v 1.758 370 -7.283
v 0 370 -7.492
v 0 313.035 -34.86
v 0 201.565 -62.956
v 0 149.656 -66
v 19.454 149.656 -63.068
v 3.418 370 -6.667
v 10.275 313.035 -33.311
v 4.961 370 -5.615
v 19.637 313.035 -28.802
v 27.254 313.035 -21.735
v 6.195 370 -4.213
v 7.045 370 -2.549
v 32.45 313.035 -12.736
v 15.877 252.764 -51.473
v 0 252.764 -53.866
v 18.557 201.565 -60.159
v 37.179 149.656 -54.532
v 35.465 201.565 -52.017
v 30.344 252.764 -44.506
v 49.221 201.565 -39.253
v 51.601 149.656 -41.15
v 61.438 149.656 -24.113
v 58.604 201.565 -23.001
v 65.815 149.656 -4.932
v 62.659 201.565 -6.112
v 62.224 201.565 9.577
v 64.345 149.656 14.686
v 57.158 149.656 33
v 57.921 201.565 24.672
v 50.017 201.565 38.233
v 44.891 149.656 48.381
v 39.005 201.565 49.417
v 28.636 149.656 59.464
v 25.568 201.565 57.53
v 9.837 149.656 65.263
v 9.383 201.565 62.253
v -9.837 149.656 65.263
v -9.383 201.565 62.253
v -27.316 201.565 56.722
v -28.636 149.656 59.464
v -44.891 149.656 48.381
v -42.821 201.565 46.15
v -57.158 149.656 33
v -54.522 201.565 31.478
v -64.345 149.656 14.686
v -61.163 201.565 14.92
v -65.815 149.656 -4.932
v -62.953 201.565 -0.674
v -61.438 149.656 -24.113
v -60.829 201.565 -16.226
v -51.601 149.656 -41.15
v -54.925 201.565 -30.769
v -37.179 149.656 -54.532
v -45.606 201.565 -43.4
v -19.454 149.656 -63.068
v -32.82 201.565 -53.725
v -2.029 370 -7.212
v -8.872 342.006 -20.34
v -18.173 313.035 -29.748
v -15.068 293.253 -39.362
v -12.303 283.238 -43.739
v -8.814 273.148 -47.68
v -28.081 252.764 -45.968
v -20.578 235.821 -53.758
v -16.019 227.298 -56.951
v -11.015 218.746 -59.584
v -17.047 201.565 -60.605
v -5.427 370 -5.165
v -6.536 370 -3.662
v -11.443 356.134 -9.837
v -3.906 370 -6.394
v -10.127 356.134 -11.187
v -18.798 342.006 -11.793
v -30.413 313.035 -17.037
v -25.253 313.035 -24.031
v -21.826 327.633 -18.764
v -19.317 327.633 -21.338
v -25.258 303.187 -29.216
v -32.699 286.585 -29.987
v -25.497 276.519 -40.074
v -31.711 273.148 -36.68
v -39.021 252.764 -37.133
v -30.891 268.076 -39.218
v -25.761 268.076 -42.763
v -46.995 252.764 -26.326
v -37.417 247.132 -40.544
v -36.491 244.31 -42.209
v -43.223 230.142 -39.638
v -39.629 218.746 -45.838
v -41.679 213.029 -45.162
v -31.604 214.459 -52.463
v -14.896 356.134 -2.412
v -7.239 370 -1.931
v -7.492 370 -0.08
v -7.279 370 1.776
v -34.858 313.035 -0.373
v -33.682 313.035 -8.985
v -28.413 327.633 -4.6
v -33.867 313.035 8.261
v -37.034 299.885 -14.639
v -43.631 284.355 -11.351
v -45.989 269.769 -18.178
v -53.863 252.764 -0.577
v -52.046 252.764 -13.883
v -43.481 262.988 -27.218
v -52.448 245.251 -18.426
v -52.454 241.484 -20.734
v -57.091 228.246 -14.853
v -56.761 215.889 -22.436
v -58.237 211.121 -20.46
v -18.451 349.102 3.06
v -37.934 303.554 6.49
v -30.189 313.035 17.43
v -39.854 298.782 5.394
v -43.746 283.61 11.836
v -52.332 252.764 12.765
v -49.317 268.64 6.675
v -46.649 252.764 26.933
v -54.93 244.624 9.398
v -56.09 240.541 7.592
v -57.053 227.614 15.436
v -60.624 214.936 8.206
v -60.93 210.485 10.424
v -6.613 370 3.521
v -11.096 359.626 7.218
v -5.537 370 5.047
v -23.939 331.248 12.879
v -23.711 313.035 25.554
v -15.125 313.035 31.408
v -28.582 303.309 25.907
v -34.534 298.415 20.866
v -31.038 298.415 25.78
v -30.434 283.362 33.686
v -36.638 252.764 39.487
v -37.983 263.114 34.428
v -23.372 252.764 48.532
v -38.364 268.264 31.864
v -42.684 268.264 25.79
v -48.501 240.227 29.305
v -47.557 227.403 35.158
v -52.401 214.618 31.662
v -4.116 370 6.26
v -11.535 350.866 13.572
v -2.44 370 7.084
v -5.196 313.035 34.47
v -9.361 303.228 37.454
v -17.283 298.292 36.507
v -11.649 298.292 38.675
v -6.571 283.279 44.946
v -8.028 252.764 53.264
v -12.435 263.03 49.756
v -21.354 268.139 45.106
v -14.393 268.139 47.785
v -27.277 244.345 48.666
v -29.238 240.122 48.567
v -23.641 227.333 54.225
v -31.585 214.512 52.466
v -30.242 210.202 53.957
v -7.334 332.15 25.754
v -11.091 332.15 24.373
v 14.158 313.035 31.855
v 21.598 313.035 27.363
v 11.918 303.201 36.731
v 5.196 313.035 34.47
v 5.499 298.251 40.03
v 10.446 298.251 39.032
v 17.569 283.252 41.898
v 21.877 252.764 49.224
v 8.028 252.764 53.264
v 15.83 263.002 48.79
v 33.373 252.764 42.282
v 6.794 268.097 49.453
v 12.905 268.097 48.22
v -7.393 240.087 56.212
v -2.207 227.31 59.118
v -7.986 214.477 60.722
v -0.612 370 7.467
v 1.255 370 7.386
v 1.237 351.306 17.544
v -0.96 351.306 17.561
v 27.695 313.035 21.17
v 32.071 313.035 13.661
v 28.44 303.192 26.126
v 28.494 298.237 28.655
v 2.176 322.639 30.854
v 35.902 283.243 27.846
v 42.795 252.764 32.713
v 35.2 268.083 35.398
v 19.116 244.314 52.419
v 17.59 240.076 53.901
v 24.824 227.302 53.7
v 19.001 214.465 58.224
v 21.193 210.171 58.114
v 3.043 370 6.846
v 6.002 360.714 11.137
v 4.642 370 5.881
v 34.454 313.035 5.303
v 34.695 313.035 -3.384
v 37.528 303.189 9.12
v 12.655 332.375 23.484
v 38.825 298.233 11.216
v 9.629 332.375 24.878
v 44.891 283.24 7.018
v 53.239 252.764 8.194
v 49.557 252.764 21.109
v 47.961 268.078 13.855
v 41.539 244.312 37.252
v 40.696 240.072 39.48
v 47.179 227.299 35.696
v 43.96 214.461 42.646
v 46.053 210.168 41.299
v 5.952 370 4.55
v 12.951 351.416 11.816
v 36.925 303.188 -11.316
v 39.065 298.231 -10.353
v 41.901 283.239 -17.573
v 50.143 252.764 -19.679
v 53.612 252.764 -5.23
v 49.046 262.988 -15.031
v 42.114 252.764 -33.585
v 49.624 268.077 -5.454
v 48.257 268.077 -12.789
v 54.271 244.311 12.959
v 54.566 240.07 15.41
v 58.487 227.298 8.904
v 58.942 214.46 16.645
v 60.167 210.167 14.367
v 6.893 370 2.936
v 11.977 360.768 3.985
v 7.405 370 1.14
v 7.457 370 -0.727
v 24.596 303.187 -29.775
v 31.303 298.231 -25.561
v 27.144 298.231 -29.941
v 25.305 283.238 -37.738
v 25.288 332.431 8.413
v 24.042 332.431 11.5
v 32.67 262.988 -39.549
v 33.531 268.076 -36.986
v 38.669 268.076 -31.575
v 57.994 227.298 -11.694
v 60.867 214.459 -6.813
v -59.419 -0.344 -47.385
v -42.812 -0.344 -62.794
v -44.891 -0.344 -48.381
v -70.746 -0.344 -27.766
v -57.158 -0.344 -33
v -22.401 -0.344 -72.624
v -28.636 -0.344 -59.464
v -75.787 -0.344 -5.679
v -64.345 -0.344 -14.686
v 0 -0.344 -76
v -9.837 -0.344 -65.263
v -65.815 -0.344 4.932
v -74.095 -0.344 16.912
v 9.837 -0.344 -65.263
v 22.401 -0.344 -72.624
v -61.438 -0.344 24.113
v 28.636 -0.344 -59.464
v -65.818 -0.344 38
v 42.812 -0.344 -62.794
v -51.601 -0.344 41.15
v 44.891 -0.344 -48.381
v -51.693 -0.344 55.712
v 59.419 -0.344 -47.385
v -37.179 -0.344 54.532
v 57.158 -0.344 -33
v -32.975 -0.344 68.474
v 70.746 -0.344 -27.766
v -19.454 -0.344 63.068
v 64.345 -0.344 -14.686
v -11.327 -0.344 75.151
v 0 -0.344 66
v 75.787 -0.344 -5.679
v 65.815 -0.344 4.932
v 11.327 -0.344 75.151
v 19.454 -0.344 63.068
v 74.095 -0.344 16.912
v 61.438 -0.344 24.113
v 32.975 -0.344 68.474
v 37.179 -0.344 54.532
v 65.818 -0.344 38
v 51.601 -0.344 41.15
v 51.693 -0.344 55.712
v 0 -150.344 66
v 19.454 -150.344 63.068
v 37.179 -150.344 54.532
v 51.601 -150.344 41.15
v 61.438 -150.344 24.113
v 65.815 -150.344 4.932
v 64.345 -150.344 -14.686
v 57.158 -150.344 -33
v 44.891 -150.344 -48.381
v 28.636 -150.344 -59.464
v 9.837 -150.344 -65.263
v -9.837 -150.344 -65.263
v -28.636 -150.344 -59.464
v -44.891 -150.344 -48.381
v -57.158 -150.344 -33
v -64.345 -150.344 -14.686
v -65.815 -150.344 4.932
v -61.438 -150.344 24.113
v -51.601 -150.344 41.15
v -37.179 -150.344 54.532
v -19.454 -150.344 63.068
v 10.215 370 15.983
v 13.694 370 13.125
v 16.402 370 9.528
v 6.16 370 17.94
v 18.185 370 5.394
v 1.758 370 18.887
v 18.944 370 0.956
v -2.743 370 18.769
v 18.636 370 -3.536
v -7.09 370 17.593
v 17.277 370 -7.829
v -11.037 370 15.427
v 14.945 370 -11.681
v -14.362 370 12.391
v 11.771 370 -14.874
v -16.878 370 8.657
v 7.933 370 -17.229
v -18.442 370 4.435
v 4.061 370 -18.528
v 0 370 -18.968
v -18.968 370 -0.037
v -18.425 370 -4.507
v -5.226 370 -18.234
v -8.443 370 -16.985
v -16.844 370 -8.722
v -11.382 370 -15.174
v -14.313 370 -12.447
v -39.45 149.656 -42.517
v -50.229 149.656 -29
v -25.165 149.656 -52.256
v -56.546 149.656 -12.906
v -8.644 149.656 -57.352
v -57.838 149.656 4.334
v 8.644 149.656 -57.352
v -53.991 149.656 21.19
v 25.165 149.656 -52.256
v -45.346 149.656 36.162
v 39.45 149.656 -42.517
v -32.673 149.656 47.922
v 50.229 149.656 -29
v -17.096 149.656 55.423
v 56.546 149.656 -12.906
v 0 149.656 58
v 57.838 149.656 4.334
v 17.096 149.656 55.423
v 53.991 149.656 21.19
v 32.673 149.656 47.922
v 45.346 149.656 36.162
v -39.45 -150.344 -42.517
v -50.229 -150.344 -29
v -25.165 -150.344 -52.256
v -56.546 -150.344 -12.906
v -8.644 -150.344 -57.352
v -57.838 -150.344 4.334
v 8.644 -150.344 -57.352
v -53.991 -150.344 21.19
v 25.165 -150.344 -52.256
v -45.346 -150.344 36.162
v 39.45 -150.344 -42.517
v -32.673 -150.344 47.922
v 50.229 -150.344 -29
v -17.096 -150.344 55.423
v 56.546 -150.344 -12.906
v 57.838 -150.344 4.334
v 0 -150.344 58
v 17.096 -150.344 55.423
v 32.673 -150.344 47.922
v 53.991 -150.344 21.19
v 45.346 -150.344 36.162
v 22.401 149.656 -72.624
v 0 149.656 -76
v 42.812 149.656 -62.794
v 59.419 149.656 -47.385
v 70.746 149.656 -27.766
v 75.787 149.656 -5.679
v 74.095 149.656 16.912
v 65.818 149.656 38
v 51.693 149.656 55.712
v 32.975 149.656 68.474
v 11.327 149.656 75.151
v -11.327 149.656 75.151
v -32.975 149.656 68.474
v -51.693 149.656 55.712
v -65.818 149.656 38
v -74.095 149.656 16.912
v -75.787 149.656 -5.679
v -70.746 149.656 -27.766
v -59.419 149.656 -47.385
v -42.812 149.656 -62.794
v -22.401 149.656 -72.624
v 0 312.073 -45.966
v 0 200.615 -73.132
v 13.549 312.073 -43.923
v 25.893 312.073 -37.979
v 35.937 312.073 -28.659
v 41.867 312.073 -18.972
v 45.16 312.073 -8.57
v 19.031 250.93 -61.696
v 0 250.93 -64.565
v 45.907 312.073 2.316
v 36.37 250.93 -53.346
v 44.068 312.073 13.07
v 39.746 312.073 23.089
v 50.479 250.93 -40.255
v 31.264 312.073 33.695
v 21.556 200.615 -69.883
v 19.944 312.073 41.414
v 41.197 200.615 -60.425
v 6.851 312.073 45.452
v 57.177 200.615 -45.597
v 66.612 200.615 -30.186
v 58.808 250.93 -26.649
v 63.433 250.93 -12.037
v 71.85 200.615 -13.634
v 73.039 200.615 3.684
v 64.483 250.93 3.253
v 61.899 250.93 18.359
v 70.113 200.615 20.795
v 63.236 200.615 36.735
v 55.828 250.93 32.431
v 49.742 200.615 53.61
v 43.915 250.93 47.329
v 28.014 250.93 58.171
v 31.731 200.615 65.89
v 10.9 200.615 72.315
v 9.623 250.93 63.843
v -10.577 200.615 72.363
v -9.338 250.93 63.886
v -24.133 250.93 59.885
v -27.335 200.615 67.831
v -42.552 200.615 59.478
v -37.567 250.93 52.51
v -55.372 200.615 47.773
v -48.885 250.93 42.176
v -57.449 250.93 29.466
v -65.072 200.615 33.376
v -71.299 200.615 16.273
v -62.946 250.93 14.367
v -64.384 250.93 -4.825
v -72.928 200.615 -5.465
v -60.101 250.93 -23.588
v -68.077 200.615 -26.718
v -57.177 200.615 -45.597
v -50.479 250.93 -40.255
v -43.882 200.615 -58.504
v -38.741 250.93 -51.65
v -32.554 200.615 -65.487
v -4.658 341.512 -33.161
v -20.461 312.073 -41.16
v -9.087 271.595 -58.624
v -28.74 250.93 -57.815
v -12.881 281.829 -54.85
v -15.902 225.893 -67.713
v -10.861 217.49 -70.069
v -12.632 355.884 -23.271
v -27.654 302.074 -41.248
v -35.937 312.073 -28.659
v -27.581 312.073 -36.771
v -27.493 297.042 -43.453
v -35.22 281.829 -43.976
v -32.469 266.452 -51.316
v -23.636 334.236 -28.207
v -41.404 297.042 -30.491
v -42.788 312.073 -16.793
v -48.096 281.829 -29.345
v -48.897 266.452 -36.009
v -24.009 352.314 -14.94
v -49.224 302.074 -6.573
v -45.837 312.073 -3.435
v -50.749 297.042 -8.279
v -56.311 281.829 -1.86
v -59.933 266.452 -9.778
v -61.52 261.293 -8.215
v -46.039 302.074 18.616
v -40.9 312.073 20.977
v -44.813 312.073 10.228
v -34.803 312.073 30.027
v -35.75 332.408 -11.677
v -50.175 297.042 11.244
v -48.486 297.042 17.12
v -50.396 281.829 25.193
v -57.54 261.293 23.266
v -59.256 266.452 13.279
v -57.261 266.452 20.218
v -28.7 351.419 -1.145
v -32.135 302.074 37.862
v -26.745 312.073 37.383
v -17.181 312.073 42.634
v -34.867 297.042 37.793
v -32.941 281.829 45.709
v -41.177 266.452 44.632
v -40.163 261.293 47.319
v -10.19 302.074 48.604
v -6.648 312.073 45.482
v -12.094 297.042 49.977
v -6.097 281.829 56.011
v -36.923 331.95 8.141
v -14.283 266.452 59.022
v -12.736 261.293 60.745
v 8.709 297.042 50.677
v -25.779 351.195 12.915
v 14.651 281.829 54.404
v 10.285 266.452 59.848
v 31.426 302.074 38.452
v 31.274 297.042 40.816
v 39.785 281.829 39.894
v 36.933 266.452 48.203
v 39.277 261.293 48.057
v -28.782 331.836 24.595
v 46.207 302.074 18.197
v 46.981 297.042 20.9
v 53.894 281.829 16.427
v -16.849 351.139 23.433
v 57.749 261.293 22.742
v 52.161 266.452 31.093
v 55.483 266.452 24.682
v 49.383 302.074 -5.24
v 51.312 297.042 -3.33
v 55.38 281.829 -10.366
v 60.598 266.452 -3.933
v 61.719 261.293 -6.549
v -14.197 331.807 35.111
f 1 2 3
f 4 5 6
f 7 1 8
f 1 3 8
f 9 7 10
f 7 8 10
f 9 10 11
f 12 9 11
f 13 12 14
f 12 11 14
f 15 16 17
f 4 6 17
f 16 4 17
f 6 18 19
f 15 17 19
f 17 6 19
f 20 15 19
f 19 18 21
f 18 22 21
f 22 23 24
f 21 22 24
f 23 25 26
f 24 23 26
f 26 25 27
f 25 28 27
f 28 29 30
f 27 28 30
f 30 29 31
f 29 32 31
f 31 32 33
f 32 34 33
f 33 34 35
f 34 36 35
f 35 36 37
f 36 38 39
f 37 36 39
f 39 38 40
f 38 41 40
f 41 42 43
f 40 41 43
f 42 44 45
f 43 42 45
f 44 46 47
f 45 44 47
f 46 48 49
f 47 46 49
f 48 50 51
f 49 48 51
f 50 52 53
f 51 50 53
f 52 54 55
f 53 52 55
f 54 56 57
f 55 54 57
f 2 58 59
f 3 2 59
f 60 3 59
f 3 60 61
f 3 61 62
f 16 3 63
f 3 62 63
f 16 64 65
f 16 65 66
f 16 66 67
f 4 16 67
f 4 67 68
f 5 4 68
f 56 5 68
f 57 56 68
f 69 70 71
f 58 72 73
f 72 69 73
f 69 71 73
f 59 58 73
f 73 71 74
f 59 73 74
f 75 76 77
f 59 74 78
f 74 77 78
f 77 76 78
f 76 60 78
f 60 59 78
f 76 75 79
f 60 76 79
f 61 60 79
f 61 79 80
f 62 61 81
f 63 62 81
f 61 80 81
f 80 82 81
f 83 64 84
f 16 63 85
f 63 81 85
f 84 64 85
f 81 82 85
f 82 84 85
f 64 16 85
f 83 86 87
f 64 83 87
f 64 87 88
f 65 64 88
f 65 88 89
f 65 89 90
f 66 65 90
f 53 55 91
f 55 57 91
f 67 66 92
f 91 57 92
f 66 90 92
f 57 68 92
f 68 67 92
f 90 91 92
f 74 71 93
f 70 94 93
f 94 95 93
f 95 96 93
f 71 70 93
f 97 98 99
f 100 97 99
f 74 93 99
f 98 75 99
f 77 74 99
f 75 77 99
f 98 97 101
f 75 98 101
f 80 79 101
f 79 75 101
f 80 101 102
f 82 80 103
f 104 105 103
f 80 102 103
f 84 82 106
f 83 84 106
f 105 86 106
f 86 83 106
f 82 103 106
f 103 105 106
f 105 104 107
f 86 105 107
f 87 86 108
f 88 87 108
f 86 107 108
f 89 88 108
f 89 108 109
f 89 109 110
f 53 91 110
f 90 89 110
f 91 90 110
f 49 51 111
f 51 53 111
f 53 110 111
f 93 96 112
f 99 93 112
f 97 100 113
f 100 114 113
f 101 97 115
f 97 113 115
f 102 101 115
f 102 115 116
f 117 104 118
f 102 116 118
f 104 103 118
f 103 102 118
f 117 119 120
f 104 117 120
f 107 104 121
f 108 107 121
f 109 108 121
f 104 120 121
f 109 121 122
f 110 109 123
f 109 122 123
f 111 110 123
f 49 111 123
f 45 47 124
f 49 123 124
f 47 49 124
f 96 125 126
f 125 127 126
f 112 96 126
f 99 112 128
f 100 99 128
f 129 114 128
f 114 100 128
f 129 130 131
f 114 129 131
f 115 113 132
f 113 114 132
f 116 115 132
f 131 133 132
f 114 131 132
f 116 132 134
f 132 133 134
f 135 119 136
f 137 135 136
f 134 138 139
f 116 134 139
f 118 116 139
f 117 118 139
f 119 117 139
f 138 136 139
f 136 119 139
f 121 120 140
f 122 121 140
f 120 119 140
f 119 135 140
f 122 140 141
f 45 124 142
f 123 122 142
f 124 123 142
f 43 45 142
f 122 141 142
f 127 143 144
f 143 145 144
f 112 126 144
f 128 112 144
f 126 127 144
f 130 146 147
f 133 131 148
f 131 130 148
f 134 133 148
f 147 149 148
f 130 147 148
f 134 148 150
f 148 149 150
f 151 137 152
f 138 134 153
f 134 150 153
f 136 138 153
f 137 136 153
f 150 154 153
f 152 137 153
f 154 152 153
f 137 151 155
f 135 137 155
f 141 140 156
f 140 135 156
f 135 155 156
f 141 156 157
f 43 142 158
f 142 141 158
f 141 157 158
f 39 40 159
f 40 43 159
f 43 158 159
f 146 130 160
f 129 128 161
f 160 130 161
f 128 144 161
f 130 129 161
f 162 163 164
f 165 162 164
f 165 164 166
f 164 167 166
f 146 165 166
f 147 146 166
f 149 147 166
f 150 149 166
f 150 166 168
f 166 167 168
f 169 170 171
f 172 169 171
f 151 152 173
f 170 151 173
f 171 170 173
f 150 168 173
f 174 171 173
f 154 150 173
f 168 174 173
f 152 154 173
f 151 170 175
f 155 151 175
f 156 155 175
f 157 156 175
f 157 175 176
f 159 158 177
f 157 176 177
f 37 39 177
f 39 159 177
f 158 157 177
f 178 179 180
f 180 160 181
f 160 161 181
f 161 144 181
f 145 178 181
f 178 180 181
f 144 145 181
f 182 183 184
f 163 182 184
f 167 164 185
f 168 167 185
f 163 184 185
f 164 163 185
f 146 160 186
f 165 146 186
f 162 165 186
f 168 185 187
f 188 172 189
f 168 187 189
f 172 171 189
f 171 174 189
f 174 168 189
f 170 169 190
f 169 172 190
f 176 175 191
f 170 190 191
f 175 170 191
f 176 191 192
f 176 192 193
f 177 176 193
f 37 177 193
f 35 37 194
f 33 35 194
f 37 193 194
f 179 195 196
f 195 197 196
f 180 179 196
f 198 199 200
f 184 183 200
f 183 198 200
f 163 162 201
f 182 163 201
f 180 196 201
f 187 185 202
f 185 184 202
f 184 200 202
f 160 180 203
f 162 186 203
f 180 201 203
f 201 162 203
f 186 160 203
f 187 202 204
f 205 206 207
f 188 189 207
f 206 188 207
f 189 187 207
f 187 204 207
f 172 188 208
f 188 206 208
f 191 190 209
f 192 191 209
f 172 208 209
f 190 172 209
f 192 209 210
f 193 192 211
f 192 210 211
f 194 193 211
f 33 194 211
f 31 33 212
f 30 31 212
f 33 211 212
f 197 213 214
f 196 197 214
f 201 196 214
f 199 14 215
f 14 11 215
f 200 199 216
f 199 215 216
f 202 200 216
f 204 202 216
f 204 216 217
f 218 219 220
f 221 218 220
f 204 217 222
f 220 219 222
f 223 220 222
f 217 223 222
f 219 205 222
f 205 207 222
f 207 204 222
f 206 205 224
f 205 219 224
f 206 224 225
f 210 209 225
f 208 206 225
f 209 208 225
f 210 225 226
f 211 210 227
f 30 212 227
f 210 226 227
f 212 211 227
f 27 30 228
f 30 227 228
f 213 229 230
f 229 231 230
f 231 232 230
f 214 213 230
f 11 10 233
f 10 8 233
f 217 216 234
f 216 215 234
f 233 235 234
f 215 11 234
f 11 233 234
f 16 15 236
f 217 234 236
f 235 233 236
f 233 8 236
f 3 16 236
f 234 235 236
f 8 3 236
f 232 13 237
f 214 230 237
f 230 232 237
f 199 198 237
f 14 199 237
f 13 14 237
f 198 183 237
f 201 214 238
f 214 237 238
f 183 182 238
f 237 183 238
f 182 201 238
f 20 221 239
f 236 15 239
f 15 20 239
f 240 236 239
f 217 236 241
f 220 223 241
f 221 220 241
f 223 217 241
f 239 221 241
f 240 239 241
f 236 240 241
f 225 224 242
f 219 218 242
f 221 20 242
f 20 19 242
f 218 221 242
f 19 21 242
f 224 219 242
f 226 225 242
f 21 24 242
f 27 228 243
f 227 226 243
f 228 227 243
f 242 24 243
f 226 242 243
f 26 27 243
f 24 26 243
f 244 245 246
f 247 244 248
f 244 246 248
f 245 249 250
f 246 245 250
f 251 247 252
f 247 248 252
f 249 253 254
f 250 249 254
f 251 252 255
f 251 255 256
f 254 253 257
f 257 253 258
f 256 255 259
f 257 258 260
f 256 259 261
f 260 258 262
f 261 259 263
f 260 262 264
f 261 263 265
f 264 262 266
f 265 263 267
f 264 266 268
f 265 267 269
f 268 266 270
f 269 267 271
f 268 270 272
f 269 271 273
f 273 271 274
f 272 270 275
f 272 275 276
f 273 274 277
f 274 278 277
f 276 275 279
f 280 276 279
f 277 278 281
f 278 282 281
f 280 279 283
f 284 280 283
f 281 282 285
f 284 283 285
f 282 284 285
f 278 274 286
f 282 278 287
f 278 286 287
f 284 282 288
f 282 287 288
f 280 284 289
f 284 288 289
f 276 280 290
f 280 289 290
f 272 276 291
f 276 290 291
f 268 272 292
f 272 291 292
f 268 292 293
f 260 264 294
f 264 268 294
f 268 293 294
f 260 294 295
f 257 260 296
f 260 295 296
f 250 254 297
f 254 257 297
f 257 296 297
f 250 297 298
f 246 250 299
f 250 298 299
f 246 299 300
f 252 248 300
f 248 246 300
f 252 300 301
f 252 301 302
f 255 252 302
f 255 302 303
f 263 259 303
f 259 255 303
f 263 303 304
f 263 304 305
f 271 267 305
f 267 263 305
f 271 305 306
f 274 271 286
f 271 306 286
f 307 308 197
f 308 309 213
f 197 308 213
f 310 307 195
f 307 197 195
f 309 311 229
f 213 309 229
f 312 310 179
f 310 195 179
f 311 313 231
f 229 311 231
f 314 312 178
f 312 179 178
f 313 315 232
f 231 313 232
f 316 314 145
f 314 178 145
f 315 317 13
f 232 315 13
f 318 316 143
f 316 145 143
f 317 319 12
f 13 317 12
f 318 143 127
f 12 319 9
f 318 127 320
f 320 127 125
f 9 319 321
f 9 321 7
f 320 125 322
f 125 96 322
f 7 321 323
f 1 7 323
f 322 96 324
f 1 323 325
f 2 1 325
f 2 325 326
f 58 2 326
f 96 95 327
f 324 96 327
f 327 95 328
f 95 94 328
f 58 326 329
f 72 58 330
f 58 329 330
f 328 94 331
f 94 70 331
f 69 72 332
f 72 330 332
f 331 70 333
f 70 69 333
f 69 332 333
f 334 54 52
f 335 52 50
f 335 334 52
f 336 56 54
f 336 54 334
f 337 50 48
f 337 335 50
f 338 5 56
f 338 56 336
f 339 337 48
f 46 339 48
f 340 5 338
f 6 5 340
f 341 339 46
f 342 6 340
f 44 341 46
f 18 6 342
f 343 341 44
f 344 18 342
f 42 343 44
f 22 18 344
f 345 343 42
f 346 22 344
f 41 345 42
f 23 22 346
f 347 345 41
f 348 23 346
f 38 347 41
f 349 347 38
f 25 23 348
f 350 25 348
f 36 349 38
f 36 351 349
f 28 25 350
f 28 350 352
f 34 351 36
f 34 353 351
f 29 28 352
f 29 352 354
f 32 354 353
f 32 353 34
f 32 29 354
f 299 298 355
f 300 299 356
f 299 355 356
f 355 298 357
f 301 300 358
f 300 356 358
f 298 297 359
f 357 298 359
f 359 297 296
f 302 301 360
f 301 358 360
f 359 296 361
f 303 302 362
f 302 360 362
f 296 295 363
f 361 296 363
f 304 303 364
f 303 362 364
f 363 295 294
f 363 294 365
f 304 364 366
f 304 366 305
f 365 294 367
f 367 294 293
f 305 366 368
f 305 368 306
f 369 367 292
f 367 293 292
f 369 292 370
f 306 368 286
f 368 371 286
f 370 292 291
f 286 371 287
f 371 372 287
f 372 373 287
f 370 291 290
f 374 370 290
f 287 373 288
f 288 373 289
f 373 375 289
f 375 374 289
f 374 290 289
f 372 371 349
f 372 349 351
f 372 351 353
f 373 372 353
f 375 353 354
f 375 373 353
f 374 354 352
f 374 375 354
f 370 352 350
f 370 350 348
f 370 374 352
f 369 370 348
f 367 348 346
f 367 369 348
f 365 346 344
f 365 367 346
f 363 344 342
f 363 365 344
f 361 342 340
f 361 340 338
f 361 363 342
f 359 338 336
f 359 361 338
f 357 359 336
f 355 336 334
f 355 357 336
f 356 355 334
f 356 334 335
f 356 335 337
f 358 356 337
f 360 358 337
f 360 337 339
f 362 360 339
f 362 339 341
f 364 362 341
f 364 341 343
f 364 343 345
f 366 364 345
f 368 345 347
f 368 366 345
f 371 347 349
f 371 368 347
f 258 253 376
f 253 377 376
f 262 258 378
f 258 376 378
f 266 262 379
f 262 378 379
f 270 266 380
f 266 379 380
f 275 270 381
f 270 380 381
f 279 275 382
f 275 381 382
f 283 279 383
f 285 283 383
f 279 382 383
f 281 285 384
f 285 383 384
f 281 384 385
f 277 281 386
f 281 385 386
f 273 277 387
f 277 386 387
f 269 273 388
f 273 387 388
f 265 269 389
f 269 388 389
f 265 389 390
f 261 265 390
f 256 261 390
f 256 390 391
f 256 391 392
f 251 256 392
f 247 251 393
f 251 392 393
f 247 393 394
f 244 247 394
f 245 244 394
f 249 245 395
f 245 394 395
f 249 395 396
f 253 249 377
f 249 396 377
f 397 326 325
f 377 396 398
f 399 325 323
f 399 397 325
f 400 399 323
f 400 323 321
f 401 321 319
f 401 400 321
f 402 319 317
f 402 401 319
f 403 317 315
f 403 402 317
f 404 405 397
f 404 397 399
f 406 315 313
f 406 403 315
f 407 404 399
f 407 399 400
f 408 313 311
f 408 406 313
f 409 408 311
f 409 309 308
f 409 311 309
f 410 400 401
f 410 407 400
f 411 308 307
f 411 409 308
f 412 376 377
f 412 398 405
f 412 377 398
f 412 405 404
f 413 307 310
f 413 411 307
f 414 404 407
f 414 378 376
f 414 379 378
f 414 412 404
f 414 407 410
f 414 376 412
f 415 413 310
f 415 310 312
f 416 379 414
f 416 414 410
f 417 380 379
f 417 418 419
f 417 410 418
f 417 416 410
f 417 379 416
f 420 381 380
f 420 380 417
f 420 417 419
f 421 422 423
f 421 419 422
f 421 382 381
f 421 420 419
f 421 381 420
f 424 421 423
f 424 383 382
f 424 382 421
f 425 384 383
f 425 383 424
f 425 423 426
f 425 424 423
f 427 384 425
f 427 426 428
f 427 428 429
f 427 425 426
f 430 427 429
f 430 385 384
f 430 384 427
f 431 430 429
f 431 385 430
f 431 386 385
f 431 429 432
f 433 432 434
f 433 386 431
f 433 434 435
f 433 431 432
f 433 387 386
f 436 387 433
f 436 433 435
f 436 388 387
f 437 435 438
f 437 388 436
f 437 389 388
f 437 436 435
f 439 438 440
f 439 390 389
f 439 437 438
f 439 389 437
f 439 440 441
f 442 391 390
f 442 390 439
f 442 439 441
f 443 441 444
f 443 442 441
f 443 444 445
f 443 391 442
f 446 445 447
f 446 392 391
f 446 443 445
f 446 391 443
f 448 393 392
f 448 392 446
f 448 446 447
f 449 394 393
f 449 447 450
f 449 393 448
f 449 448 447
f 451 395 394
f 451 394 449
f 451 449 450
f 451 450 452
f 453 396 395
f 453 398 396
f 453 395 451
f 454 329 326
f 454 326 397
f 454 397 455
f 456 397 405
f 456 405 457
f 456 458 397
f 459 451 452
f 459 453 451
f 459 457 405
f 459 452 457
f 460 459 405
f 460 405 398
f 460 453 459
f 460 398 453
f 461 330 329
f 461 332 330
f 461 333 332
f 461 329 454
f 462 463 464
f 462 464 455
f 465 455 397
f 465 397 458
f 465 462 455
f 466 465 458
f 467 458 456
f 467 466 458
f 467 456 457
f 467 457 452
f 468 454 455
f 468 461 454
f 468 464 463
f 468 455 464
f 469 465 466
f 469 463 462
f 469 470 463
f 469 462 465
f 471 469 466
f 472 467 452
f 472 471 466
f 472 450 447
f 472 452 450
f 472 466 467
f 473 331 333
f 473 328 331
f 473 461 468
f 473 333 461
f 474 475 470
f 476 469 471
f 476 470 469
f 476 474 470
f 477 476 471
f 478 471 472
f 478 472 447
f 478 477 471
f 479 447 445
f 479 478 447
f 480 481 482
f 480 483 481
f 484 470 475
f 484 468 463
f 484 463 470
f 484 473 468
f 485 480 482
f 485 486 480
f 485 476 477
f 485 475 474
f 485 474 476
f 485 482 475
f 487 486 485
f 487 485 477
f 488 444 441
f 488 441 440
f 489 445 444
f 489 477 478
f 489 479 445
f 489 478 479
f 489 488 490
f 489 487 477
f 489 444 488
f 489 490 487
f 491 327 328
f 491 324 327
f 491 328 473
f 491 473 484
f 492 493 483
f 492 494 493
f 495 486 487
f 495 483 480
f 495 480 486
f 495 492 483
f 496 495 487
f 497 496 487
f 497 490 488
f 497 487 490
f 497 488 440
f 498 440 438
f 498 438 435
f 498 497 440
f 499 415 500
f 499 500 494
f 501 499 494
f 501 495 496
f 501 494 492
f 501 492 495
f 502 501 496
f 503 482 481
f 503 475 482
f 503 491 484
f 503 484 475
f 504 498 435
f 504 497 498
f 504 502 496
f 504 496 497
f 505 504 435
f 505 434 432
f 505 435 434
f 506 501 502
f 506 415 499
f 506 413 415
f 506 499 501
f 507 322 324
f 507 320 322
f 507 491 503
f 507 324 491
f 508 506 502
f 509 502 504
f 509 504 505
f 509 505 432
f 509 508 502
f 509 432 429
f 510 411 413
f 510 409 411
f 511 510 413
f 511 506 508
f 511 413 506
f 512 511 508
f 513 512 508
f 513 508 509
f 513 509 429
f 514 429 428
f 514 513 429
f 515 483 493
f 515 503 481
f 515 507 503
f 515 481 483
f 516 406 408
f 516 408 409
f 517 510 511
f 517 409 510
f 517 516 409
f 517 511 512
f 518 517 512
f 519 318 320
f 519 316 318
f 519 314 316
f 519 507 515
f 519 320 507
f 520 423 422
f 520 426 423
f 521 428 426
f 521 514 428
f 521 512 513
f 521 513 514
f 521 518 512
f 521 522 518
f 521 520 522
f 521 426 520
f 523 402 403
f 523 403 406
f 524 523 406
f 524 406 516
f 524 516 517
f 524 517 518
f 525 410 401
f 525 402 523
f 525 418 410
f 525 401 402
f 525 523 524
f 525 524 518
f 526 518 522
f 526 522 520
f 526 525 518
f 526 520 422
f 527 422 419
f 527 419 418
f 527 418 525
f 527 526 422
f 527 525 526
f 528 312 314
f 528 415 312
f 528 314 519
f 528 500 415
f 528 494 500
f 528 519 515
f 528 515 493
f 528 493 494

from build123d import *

# Parameters (mm, degrees)
BOSS_EXTRUDE1_START = -300
SKETCH2_R           = 66
SKETCH2_R_2         = 58
BOSS_EXTRUDE1_DEPTH = 300
SKETCH3_R           = 132.244783432
CUT_EXTRUDE1_DEPTH  = 30


with BuildPart() as part:
    # Sketch1 → Revolve3 (revolve)
    with BuildSketch(Plane.XY, mode=Mode.PRIVATE) as revolve3_sk:
        with BuildLine():
            Line((76, -0.344450695), (76, 149.655549305))
            add(Edge.make_bspline(
                [(0.773326773, 400), (0.980987301, 399.685666805), (1.398059308, 399.052178662), (2.284541161, 397.700550841), (3.251241341, 396.211212549), (4.217116507, 394.710095548), (5.194582422, 393.178406868), (6.158529674, 391.654155139), (7.117841951, 390.123894266), (8.076303348, 388.581395306), (9.033719413, 387.026713906), (16.961041975, 374.037008419), (28.571782608, 353.014913091), (42.416505119, 323.258697721), (56.925249661, 282.331206246), (67.374040256, 242.08025425), (72.64853455, 209.220016816), (74.898010785, 183.923611768), (75.587535098, 169.173424136), (75.711753269, 165.955632222), (75.799260065, 163.208321649), (75.849799507, 161.393000412), (75.892883214, 159.587415565), (75.928787343, 157.784317211), (75.957511328, 155.967426666), (75.979054713, 154.18293971), (75.99341716, 152.40648291), (75.99880312, 150.790982345), (76, 150.032282914), (76, 149.655549305)],
                knots=[0.082616428, 0.082616428, 0.082616428, 0.082616428, 0.082616428, 0.088299706, 0.093982984, 0.099666263, 0.105349541, 0.111032819, 0.116716097, 0.122399375, 0.128082653, 0.133891142, 0.139699631, 0.313954311, 0.430124092, 0.546293874, 0.685697612, 0.836718331, 0.848335309, 0.865760775, 0.871569264, 0.877252541, 0.882935819, 0.888619096, 0.894302373, 0.899985651, 0.905668928, 0.911352205, 0.917035483, 0.917035483, 0.917035483, 0.917035483, 0.917035483], degree=4))
            Line((0.773326773, 400), (0.751990255, 381.399188372))
            add(Edge.make_bspline(
                [(0.751990255, 381.399188372), (0.873010956, 381.201299105), (3.80991255, 376.390848647), (12.106986141, 362.199887034), (29.393699031, 328.534275172), (48.723069726, 277.933780444), (60.486978792, 225.059949932), (64.620486576, 187.441870002), (65.581155817, 169.911010475), (65.839847213, 161.807957388), (65.916827257, 158.438692592), (65.954572398, 156.064661932), (65.971527827, 154.723430387), (65.981910919, 153.726401125), (65.989958451, 152.707134592), (65.995746725, 151.595575293), (65.999239242, 150.498770837), (66, 149.951992083), (66, 149.655549305)],
                knots=[0.132529105, 0.132529105, 0.132529105, 0.132529105, 0.134767619, 0.18691881, 0.291221192, 0.499825955, 0.708430719, 0.812733101, 0.864884292, 0.877922089, 0.890959887, 0.897478786, 0.900738235, 0.903997685, 0.907257134, 0.910516584, 0.913776033, 0.917035483, 0.917035483, 0.917035483, 0.917035483], degree=3))
            Line((66, 149.655549305), (66, -0.344450695))
            Line((66, -0.344450695), (76, -0.344450695))
        make_face()
    revolve(revolve3_sk.sketch.rotate(Axis((0, -198.817850362, 0), (0, -1, 0)), 270), axis=Axis((0, -198.817850362, 0), (0, -1, 0)))

    # Sketch2 → Boss-Extrude1 (add)
    with BuildSketch(Plane(origin=(0, 149.655549305, 0), x_dir=(1, 0, 0), z_dir=(0, 1, 0)).offset(BOSS_EXTRUDE1_START)):
        with Locations(Location((0, 0, 0), (0, 0, 270))):
            Circle(SKETCH2_R)
        with Locations(Location((0, 0, 0), (0, 0, 270))):
            Circle(SKETCH2_R_2, mode=Mode.SUBTRACT)
    extrude(amount=BOSS_EXTRUDE1_DEPTH)

    # Sketch3 → Cut-Extrude1 (cut)
    with BuildSketch(Plane(origin=(0, 400, 0), x_dir=(-1, 0, 0), z_dir=(0, -1, 0))):
        Circle(SKETCH3_R)
    extrude(amount=CUT_EXTRUDE1_DEPTH, mode=Mode.SUBTRACT)


solid = part.part
